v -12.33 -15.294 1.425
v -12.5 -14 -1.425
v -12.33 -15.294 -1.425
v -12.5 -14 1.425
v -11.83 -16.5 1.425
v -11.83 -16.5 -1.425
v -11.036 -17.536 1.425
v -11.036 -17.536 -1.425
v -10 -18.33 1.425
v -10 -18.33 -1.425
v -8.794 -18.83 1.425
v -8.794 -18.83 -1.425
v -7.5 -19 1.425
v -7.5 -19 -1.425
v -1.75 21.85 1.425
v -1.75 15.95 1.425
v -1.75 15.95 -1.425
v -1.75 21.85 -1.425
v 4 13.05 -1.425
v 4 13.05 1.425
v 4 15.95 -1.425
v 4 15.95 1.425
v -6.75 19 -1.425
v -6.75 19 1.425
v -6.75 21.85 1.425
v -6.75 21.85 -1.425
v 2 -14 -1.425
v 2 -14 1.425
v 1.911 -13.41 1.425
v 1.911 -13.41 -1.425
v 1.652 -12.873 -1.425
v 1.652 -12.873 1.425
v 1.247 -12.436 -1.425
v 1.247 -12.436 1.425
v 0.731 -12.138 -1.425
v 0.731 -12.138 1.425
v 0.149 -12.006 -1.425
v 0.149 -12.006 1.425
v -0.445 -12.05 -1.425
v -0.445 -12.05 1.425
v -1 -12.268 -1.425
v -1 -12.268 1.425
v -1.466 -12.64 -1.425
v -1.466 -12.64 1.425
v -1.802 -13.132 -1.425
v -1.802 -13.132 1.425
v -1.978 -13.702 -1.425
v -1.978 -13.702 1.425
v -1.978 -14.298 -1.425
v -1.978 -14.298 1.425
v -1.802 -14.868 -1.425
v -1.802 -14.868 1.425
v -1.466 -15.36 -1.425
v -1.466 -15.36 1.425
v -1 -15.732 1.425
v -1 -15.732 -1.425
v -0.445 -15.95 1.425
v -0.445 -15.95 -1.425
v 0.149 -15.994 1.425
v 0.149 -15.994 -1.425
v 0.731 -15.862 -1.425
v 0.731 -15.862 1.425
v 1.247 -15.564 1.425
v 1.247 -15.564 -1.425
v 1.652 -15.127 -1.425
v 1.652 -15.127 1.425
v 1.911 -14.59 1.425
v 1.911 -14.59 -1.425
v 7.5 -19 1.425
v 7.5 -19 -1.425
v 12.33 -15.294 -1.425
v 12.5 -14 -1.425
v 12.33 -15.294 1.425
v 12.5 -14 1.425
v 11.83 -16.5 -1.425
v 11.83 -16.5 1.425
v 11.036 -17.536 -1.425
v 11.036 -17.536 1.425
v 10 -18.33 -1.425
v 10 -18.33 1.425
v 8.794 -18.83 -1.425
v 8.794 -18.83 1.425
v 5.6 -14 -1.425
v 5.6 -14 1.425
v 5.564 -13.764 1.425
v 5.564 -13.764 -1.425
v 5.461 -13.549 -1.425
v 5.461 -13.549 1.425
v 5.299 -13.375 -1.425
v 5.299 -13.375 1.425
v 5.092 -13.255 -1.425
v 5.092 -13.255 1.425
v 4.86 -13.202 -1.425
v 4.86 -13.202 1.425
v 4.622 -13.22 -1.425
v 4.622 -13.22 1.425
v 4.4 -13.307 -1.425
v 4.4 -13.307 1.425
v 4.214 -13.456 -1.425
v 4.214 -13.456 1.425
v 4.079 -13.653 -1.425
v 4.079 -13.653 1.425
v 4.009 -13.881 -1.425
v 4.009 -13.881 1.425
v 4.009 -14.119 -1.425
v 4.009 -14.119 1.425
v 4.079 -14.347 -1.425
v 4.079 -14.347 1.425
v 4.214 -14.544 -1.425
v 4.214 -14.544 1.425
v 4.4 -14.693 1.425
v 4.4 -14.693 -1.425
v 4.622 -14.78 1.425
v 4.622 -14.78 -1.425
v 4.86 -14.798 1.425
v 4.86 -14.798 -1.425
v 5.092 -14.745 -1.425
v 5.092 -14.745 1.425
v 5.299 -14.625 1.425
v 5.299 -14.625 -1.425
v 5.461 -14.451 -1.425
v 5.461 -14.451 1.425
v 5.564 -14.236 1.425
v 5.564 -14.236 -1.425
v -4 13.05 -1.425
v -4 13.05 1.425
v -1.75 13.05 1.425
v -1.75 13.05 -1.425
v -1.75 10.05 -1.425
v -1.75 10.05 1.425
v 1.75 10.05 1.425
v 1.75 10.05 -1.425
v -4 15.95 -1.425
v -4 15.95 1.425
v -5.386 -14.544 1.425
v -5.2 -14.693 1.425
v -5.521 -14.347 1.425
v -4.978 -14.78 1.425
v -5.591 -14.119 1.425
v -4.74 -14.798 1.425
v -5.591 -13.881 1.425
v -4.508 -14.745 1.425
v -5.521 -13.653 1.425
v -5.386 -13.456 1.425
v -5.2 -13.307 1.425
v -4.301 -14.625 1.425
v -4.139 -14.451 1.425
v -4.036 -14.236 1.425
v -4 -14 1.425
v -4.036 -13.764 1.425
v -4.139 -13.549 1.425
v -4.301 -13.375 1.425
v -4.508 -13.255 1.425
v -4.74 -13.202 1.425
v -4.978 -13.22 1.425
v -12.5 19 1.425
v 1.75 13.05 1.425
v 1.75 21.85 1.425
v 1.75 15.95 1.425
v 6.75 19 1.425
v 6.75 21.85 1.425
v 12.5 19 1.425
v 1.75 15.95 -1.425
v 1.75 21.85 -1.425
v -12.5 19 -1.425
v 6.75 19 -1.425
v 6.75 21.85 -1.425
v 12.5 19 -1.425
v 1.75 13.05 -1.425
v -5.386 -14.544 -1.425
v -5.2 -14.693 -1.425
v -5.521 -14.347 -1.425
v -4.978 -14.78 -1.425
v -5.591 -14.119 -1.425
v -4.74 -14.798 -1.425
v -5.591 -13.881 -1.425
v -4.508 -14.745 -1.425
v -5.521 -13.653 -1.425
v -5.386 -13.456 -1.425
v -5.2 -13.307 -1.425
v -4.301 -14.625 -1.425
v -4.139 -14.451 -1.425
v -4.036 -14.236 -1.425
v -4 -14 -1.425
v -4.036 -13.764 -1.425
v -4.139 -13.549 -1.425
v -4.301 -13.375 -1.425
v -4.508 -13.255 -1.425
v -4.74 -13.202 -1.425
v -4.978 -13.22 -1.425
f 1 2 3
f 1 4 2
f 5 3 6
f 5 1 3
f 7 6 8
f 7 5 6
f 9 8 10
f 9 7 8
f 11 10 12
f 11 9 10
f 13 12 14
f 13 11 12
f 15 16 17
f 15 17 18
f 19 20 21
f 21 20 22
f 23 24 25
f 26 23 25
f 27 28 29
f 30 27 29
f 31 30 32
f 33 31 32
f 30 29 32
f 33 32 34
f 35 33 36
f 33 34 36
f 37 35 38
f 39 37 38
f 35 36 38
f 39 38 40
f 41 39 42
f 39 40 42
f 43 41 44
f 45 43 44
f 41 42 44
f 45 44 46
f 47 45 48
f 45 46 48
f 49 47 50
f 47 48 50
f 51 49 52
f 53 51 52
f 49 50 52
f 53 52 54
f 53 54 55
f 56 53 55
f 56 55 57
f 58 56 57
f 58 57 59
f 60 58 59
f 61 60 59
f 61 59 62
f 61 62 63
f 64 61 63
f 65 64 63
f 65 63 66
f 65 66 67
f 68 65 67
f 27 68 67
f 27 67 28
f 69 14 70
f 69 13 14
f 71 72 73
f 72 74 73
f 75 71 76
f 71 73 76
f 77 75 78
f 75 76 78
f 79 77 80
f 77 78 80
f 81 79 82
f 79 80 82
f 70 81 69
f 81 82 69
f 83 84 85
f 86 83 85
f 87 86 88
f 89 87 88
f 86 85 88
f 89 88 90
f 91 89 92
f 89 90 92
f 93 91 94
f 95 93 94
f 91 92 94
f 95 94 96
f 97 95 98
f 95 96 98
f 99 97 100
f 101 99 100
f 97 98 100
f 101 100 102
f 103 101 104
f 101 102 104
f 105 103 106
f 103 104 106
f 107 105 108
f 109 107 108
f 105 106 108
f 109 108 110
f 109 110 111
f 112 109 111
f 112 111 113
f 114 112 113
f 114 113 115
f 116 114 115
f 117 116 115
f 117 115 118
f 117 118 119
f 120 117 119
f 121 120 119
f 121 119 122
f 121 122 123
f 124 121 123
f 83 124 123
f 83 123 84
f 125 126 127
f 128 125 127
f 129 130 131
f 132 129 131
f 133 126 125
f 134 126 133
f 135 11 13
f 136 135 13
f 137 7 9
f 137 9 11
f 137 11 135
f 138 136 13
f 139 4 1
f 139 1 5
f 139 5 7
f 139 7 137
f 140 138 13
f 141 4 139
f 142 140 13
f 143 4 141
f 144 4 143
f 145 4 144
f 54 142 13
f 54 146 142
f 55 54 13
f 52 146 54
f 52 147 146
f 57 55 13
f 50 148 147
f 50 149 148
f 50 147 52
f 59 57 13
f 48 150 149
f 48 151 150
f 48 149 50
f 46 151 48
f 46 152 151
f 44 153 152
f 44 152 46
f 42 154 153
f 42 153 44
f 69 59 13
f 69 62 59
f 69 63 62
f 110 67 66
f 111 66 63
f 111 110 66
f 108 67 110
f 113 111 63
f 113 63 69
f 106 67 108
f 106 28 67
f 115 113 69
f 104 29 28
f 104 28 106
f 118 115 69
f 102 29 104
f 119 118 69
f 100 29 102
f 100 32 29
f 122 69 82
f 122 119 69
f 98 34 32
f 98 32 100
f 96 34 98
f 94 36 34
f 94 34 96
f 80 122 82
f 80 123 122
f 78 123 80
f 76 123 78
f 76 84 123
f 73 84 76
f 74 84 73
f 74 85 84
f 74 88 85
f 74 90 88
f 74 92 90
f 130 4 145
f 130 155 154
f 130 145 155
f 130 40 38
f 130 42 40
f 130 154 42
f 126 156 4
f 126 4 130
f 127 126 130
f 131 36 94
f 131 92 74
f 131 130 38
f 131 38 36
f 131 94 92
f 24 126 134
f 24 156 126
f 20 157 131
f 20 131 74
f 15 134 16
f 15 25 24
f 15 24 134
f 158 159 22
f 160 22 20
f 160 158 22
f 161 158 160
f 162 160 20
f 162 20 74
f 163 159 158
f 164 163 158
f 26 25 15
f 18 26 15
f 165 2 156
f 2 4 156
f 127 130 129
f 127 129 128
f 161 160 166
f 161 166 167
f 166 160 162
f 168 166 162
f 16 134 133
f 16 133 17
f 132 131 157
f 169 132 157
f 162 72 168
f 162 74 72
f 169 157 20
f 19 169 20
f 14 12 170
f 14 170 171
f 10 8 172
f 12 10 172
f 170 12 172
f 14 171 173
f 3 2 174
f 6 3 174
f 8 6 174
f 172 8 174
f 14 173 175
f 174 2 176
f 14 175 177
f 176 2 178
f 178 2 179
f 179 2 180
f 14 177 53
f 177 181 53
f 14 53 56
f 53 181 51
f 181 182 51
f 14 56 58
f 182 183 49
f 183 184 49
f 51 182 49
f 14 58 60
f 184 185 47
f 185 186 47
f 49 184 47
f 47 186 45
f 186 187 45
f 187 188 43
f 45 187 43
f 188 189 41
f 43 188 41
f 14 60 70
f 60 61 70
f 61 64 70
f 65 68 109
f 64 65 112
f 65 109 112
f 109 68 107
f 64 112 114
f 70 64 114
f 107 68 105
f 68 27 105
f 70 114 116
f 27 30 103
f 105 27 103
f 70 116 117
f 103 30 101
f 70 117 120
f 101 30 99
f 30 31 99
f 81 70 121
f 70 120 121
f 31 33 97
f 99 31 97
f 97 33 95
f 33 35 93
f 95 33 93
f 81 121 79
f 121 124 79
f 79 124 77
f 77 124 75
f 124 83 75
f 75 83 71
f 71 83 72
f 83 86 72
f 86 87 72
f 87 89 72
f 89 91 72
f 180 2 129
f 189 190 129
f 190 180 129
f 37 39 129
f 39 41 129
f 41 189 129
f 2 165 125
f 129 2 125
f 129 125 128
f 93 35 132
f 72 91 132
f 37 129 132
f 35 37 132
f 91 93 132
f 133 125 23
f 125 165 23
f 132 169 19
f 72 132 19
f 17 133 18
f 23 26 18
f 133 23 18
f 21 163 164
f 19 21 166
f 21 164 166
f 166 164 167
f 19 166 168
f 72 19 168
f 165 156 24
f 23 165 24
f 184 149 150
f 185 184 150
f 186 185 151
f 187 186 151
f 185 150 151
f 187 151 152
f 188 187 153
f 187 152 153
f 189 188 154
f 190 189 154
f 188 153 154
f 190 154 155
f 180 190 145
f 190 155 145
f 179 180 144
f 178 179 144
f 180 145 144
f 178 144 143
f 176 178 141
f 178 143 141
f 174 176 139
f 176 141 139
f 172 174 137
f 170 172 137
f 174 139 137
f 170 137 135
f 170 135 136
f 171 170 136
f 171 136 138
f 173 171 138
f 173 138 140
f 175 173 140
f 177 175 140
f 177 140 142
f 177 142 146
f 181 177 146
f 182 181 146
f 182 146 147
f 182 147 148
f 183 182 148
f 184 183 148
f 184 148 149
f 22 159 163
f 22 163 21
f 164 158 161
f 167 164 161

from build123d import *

# Parameters (mm, degrees)
SKETCH1_W           = 25
SKETCH1_H           = 38
BOSS_EXTRUDE1_DEPTH = 1.425
SKETCH2_R           = 2
CUT_EXTRUDE1_DEPTH  = 23.92100565
SKETCH3_R           = 0.8
CUT_EXTRUDE2_DEPTH  = 23.92100565
SKETCH4_W           = 5
SKETCH4_H           = 2.85
BOSS_EXTRUDE2_DEPTH = 2.85
SKETCH5_W           = 8
SKETCH5_H           = 2.9
CUT_EXTRUDE3_DEPTH  = 26.333673243
SKETCH6_W           = 3.5
SKETCH6_H           = 8.95
CUT_EXTRUDE4_DEPTH  = 26.333673243
FILLET1_R           = 5


with BuildPart() as part:
    # Sketch1 → Boss-Extrude1 (new, symmetric)
    with BuildSketch(Plane.XY):
        Rectangle(SKETCH1_W, SKETCH1_H)
    extrude(amount=BOSS_EXTRUDE1_DEPTH, both=True)

    # Sketch2 → Cut-Extrude1 (cut, through all)
    with BuildSketch(Plane.XY.offset(1.425)):
        with Locations((0, -14)):
            Circle(SKETCH2_R)
    extrude(amount=-CUT_EXTRUDE1_DEPTH, mode=Mode.SUBTRACT)

    # Sketch3 → Cut-Extrude2 (cut, through all)
    with BuildSketch(Plane.XY.offset(1.425)):
        with Locations((-4.8, -14)):
            Circle(SKETCH3_R)
        with Locations((4.8, -14)):
            Circle(SKETCH3_R)
    extrude(amount=-CUT_EXTRUDE2_DEPTH, mode=Mode.SUBTRACT)

    # Sketch4 → Boss-Extrude2 (add)
    with BuildSketch(Plane.XY.offset(1.425)):
        with Locations((-4.25, 20.425)):
            Rectangle(SKETCH4_W, SKETCH4_H)
        with Locations((4.25, 20.425)):
            Rectangle(SKETCH4_W, SKETCH4_H)
    extrude(amount=-BOSS_EXTRUDE2_DEPTH)

    # Sketch5 → Cut-Extrude3 (cut, through all)
    with BuildSketch(Plane.XY.offset(1.425)):
        with Locations((0, 14.5)):
            Rectangle(SKETCH5_W, SKETCH5_H)
    extrude(amount=-CUT_EXTRUDE3_DEPTH, mode=Mode.SUBTRACT)

    # Sketch6 → Cut-Extrude4 (cut, through all)
    with BuildSketch(Plane.XY.offset(1.425)):
        with Locations((0, 14.525)):
            Rectangle(SKETCH6_W, SKETCH6_H)
    extrude(amount=-CUT_EXTRUDE4_DEPTH, mode=Mode.SUBTRACT)

    # Fillet1
    fillet1_edges = [part.edges().sort_by_distance(p)[0] for p in [
        (12.5, -19, 0),
        (-12.5, -19, 0),
    ]]
    fillet(fillet1_edges, radius=FILLET1_R)


solid = part.part
